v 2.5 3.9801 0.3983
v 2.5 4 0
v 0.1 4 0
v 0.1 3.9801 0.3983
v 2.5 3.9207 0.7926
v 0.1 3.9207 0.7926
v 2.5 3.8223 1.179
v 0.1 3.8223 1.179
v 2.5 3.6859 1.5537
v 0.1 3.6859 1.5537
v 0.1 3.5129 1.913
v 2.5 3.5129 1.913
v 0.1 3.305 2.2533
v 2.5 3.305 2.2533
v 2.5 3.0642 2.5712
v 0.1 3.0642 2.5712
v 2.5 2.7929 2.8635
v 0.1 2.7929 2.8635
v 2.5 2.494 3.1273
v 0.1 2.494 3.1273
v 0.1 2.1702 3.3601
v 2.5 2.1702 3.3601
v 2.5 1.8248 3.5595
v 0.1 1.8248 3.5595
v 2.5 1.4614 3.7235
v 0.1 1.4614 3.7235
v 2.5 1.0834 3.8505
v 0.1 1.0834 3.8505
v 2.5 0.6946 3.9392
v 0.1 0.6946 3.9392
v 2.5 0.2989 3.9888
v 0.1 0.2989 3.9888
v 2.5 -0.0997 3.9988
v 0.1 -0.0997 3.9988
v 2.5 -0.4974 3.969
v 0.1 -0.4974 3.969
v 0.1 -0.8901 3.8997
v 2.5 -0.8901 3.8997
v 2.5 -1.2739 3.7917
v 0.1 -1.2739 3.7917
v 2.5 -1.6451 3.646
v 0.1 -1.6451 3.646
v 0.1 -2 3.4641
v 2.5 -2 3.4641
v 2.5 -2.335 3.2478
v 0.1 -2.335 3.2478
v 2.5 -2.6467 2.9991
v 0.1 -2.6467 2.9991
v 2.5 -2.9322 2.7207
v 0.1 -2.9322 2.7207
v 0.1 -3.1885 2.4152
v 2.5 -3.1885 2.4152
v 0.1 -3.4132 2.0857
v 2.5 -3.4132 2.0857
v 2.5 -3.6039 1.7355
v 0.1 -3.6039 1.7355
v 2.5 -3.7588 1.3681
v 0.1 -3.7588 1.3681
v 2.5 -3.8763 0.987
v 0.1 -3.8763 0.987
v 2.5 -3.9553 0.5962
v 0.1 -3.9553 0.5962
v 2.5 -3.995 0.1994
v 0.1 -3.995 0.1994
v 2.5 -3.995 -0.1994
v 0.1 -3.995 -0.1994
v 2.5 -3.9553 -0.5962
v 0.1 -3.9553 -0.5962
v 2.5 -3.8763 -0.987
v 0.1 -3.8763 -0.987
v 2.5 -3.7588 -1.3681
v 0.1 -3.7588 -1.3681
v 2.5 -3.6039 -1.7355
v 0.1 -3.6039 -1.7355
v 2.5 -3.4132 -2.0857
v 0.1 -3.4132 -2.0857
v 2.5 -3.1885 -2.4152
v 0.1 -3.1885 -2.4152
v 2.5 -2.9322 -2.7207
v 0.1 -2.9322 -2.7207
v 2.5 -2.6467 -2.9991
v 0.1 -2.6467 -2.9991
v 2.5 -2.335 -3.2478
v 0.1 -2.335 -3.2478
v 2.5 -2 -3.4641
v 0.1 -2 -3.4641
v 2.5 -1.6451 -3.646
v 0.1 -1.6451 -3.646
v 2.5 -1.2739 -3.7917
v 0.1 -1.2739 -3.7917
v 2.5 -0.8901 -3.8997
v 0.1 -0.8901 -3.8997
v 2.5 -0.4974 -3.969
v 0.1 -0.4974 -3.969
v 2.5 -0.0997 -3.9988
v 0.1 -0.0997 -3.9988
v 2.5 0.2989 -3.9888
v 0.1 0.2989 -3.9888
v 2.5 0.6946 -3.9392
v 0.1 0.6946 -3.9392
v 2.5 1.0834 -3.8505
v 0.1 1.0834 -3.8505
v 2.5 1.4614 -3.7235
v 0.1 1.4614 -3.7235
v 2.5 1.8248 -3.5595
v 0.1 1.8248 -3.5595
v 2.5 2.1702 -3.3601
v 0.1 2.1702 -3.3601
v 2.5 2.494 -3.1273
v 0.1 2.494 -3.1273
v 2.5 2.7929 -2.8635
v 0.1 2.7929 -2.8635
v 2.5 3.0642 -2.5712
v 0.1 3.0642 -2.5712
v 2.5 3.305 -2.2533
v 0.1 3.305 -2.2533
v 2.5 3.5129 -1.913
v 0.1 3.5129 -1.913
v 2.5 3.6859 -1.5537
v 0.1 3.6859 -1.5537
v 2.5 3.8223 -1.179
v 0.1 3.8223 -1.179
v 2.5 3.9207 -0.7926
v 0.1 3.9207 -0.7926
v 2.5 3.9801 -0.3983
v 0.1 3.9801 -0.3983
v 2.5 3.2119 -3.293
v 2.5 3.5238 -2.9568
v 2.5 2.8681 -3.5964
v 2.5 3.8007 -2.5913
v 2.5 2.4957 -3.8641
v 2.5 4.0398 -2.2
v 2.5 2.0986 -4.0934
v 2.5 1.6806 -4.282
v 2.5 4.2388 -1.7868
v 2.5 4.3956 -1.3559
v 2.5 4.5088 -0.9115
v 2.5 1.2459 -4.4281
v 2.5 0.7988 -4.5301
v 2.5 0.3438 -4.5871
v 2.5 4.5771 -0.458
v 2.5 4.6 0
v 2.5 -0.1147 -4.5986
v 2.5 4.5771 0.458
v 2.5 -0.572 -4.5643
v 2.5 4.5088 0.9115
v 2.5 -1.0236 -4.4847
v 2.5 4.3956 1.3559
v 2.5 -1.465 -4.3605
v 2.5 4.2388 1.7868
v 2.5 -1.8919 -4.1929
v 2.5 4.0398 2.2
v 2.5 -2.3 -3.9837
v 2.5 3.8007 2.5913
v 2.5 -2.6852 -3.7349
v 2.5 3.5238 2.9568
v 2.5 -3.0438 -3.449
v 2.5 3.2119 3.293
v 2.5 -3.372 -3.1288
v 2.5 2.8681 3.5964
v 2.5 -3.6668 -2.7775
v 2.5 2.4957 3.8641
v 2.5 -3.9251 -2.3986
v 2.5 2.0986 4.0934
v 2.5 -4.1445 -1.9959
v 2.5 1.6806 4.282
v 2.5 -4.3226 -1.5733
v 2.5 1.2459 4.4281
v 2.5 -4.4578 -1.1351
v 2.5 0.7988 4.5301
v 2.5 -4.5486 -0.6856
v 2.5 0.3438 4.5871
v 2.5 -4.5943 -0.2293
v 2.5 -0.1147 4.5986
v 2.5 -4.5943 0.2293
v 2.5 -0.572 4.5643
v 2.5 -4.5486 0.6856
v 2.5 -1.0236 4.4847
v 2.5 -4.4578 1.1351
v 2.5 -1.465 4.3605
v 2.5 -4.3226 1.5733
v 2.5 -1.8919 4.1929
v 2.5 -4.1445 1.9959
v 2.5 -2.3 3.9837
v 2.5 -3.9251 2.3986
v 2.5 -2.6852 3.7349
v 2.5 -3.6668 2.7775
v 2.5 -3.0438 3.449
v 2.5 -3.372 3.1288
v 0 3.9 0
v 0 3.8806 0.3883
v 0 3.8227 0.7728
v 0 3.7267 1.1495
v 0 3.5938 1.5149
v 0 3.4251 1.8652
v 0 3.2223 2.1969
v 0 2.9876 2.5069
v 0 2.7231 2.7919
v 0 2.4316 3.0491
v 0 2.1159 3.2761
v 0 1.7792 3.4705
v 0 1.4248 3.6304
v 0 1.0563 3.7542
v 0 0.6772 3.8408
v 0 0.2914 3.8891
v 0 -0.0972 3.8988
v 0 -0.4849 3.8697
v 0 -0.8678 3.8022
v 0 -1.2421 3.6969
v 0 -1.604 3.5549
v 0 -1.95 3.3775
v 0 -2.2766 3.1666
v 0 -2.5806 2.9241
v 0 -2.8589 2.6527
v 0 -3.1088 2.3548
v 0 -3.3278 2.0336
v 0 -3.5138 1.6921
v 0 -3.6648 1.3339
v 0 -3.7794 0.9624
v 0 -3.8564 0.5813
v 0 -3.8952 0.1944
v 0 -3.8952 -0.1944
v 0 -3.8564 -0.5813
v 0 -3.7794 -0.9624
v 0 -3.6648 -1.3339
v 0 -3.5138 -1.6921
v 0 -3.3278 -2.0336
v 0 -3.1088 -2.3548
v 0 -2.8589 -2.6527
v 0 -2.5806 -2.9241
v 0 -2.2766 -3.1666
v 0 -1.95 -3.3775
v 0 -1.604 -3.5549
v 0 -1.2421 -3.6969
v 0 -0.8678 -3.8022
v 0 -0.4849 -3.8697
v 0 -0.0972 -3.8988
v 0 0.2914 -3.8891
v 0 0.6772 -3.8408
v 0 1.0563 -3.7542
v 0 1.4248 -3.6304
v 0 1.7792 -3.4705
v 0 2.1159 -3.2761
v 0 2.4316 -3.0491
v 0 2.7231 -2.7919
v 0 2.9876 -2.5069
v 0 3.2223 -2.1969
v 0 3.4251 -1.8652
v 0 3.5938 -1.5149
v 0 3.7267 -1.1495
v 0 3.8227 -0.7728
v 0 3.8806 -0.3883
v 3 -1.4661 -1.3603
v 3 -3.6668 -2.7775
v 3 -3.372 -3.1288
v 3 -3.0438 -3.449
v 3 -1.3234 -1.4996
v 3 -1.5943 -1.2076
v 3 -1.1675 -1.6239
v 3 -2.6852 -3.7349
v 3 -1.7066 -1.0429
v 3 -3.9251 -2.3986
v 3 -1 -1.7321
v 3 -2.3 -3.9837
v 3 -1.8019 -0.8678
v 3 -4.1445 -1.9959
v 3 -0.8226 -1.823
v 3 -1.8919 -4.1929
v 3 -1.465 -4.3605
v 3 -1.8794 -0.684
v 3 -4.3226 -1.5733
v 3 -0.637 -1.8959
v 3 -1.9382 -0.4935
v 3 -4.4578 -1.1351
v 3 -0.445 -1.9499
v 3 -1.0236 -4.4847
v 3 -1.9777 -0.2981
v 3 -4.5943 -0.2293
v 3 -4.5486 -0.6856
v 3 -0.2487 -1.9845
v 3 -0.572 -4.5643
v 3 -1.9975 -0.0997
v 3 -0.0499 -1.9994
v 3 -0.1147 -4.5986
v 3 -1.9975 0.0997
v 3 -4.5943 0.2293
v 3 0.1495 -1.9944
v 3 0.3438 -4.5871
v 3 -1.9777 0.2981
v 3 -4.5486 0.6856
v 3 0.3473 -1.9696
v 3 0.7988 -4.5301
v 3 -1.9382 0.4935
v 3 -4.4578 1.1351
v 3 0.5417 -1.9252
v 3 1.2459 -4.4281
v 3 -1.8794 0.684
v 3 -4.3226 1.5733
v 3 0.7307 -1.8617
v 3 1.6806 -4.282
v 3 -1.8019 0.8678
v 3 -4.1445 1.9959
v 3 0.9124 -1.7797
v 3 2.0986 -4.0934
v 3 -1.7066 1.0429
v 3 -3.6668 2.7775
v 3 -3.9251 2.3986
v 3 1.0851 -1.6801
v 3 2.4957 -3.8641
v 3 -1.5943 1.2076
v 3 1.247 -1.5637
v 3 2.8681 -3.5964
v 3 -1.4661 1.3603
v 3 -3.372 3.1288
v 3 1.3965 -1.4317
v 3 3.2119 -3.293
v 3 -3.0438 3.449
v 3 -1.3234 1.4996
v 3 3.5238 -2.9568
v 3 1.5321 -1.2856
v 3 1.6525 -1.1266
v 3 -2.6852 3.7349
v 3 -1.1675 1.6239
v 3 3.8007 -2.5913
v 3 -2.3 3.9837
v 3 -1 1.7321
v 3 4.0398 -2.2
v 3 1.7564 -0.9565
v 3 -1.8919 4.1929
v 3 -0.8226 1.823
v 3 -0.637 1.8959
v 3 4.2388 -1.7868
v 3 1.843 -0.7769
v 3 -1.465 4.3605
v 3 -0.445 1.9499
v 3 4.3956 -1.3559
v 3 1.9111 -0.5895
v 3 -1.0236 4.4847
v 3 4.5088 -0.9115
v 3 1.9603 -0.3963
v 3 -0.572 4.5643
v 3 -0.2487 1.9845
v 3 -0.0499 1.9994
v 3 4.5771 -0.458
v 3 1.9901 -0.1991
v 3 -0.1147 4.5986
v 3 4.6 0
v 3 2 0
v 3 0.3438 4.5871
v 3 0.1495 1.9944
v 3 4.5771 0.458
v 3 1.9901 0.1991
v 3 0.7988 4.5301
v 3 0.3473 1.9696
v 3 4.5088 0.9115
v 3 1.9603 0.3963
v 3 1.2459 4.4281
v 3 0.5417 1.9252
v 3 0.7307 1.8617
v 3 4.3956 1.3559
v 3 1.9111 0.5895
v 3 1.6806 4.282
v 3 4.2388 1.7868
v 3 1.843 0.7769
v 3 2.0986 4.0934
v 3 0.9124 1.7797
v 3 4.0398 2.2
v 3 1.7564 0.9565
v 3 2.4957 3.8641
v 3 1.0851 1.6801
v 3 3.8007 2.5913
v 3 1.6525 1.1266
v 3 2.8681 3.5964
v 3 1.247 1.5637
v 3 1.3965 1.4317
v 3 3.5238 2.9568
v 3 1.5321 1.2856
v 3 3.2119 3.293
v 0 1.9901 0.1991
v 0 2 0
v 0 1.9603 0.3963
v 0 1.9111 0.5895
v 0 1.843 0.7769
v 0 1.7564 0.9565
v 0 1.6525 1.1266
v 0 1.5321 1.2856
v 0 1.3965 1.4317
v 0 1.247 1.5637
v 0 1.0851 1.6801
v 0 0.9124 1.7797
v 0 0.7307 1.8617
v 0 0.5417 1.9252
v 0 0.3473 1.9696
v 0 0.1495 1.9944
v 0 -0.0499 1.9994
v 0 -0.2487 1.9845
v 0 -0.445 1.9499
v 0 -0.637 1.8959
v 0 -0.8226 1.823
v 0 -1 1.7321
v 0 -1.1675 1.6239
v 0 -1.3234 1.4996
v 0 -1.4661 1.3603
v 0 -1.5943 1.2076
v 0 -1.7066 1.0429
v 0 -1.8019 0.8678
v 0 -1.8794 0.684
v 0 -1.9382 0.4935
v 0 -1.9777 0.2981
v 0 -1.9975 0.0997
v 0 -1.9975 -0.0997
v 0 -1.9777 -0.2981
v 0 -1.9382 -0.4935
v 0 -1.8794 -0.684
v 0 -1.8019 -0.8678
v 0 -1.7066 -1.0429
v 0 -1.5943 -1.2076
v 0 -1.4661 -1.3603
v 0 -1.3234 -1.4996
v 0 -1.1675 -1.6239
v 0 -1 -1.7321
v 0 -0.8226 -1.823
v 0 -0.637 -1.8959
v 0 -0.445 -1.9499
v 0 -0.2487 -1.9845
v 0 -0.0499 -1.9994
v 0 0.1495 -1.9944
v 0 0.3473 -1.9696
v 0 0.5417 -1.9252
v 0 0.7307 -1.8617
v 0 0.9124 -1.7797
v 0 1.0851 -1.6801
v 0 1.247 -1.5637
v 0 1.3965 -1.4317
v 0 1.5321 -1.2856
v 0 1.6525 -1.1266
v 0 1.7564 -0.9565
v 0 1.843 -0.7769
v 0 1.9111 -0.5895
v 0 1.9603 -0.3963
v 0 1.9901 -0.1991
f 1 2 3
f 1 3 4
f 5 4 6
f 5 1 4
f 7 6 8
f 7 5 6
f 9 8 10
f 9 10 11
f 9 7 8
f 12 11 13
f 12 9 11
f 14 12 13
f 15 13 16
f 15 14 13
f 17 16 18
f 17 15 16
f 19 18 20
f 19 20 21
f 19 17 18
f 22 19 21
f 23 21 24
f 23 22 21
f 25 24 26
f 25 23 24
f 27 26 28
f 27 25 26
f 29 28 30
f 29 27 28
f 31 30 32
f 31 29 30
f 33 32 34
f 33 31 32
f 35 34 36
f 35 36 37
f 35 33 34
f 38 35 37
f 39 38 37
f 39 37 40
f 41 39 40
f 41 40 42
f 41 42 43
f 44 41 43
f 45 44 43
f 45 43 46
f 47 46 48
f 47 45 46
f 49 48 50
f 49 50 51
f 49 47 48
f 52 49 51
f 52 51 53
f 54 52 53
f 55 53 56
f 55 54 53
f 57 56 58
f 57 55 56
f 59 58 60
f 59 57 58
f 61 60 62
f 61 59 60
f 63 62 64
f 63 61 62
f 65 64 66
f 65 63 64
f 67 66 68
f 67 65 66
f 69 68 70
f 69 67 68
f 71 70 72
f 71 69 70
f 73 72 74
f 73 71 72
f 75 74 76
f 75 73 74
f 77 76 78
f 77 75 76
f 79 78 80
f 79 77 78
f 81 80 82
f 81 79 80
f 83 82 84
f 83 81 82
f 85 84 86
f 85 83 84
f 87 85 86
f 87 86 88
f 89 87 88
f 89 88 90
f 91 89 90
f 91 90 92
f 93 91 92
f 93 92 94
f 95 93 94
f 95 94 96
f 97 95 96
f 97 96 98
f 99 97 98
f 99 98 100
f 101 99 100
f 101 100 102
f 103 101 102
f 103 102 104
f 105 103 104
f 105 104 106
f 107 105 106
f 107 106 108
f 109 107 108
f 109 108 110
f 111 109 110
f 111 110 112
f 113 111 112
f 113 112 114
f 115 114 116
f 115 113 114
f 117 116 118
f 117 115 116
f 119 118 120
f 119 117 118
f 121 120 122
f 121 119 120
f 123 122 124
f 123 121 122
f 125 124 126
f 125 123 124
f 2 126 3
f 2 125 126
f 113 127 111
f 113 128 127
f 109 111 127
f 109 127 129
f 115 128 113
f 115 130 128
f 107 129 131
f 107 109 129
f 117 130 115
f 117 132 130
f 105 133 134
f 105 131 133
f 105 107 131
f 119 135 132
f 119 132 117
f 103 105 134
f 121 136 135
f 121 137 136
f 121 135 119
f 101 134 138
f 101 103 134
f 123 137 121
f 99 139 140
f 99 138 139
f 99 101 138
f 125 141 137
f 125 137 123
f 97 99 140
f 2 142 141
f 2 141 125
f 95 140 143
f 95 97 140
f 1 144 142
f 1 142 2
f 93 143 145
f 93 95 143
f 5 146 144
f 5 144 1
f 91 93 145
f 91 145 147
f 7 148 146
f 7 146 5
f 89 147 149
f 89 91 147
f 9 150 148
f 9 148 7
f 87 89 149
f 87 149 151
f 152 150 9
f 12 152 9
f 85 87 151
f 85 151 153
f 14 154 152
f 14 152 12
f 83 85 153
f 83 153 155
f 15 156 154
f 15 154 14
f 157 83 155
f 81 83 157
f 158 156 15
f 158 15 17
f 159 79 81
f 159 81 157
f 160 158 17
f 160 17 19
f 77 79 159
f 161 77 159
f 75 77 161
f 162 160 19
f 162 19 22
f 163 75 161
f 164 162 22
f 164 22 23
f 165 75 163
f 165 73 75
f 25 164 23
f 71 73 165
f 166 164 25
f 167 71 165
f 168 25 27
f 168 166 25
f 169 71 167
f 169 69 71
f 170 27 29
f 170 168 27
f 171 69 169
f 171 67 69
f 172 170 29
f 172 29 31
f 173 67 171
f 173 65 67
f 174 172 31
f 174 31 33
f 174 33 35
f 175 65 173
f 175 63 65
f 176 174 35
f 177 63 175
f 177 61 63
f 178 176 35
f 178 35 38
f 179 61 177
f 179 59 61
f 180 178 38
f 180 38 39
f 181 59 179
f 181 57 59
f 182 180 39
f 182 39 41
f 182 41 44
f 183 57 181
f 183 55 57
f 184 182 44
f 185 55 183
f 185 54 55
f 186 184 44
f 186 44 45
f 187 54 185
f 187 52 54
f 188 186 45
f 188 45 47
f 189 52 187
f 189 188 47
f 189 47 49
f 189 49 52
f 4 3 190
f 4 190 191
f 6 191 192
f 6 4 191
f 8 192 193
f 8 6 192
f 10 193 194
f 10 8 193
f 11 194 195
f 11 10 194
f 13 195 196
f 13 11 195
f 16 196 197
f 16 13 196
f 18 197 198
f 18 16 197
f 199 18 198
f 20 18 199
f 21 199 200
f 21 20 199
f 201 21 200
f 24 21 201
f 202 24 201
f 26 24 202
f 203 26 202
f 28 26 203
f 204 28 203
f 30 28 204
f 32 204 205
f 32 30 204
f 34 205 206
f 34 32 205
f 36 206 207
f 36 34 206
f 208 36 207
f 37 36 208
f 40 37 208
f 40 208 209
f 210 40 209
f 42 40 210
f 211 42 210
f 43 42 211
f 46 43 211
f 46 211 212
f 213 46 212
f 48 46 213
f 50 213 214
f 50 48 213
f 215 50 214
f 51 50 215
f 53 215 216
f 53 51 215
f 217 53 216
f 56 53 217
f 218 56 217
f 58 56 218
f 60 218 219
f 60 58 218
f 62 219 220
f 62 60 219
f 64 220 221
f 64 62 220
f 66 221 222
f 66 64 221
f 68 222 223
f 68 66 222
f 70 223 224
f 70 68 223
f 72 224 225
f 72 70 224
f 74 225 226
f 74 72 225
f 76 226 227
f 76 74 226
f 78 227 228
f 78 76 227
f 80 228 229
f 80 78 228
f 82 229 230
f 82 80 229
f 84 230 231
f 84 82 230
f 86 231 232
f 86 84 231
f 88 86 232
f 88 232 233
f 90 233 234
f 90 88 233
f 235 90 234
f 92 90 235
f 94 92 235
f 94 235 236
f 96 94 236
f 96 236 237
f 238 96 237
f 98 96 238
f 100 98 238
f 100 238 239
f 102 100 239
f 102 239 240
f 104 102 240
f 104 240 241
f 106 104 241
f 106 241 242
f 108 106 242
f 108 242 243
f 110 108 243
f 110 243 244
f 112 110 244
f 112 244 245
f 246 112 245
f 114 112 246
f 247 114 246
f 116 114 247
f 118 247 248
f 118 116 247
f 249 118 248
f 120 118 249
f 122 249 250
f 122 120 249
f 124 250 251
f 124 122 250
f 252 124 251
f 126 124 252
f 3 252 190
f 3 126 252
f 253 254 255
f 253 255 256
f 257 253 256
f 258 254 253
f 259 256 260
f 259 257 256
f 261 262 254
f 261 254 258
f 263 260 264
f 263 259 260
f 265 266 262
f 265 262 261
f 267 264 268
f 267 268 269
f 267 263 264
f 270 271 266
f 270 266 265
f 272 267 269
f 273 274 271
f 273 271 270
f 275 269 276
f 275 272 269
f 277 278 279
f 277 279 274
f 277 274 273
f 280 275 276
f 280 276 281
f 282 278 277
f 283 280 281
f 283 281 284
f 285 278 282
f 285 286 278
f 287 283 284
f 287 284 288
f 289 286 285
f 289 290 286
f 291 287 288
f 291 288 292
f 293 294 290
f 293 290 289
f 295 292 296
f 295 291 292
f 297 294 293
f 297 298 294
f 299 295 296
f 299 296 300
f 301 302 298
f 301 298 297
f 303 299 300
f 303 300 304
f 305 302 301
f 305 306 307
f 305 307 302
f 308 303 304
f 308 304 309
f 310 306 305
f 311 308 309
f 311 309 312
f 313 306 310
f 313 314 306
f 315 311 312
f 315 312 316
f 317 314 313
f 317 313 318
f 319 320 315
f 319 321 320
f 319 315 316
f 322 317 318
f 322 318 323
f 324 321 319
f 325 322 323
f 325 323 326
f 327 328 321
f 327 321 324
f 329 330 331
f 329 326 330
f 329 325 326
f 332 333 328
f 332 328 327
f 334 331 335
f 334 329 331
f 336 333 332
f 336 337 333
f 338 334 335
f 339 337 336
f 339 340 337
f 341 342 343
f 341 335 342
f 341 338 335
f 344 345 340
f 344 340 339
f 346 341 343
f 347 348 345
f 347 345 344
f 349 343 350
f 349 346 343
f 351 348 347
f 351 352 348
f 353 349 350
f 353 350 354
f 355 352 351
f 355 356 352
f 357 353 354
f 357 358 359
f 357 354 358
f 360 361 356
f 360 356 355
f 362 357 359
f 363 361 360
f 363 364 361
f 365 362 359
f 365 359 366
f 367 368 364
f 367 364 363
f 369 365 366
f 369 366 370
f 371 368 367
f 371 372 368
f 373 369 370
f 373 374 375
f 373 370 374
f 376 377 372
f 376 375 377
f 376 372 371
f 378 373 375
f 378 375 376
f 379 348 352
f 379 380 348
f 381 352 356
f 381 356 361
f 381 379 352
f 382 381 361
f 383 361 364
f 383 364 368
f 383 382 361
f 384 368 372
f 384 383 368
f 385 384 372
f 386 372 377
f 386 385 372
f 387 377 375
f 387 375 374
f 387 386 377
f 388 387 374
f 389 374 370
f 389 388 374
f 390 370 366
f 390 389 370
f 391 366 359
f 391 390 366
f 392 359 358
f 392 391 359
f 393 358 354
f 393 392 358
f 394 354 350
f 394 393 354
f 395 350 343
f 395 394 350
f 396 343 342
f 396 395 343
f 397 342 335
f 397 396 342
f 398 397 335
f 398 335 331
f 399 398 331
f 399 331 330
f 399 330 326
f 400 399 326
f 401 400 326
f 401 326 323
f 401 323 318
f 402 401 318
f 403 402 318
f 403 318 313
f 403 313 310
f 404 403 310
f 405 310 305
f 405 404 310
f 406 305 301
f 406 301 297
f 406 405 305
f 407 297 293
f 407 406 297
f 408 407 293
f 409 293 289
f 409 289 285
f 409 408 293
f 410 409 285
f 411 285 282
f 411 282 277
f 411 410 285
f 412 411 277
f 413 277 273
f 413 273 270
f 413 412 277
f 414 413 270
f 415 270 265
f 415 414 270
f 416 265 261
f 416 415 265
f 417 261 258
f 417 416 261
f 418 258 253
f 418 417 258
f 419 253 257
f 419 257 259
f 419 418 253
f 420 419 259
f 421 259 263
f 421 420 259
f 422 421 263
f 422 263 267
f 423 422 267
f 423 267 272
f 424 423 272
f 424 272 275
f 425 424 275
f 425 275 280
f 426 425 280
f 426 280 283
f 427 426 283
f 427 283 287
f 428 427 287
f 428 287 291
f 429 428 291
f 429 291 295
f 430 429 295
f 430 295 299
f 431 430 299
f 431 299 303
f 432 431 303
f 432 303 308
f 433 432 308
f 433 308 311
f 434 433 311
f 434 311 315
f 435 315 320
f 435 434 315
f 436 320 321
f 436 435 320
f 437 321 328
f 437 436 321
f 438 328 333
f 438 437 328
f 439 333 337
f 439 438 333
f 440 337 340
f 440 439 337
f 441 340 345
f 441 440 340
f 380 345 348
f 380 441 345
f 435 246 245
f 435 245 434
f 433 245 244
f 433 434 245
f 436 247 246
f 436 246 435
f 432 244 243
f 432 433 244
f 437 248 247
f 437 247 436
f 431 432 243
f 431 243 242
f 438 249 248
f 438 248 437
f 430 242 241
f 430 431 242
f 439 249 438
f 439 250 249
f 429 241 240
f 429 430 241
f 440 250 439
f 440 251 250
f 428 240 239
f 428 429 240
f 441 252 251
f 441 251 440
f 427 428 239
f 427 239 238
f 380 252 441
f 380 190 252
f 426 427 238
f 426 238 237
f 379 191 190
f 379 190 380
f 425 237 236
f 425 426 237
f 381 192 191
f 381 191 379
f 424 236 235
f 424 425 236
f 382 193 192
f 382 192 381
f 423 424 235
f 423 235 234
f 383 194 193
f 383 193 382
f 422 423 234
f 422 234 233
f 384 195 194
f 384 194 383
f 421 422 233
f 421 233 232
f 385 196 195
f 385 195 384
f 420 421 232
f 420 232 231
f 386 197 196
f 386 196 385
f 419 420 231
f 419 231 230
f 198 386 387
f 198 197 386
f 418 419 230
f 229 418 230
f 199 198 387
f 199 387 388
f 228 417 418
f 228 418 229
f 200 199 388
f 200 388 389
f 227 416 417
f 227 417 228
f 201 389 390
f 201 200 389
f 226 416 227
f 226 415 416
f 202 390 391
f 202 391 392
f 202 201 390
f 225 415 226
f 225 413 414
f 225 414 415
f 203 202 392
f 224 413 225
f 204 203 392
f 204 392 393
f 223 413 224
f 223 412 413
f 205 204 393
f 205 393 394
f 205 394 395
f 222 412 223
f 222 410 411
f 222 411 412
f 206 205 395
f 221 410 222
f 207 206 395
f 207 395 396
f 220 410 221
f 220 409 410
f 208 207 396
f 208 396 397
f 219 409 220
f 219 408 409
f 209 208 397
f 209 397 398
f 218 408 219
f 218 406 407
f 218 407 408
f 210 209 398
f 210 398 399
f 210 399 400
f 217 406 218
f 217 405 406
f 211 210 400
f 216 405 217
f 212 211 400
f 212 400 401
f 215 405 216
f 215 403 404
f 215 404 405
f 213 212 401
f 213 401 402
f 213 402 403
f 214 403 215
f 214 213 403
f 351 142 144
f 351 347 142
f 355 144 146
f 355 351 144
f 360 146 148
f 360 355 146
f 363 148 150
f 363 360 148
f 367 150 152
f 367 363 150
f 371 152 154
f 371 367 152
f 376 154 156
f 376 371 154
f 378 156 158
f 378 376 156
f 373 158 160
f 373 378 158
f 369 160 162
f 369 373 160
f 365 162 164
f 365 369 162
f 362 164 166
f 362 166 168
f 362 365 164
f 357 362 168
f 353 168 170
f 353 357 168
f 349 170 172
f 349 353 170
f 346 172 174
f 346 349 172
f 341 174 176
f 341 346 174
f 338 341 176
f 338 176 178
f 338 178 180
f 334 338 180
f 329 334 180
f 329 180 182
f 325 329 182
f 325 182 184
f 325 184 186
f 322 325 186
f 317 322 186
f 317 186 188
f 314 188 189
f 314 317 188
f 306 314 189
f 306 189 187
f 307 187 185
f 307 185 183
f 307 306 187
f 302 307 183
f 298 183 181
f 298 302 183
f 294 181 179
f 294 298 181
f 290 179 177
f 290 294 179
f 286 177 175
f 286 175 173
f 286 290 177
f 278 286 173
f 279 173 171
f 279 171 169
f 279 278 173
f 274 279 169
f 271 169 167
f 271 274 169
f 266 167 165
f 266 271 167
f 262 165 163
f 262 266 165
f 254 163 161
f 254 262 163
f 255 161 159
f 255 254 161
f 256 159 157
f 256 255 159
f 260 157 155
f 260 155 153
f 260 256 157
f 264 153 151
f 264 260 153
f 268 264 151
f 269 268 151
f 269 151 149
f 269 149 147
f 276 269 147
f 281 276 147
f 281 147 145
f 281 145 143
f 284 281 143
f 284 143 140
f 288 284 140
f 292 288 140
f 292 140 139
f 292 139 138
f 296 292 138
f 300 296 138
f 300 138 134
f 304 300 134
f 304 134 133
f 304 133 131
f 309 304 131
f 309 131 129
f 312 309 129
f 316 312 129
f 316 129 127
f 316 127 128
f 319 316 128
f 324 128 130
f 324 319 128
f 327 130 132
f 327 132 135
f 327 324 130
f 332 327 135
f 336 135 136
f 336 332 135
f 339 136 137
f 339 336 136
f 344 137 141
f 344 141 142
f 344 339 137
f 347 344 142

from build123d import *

# Parameters (mm, degrees)
CHAMFER_1_SIZE = 0.1


with BuildPart() as part:
    # 草图1 → 旋转1 (revolve)
    with BuildSketch(Plane.XY):
        Polygon((0, 2), (0, 4), (2.5, 4), (2.5, 4.6), (3, 4.6), (3, 2), align=None)
    revolve(axis=Axis((0, 0, 0), (1, 0, 0)))

    # 倒角1
    chamfer_1_edges = [part.edges().sort_by_distance(p)[0] for p in [
        (0, -4, 0),
    ]]
    chamfer(chamfer_1_edges, length=CHAMFER_1_SIZE)


solid = part.part
